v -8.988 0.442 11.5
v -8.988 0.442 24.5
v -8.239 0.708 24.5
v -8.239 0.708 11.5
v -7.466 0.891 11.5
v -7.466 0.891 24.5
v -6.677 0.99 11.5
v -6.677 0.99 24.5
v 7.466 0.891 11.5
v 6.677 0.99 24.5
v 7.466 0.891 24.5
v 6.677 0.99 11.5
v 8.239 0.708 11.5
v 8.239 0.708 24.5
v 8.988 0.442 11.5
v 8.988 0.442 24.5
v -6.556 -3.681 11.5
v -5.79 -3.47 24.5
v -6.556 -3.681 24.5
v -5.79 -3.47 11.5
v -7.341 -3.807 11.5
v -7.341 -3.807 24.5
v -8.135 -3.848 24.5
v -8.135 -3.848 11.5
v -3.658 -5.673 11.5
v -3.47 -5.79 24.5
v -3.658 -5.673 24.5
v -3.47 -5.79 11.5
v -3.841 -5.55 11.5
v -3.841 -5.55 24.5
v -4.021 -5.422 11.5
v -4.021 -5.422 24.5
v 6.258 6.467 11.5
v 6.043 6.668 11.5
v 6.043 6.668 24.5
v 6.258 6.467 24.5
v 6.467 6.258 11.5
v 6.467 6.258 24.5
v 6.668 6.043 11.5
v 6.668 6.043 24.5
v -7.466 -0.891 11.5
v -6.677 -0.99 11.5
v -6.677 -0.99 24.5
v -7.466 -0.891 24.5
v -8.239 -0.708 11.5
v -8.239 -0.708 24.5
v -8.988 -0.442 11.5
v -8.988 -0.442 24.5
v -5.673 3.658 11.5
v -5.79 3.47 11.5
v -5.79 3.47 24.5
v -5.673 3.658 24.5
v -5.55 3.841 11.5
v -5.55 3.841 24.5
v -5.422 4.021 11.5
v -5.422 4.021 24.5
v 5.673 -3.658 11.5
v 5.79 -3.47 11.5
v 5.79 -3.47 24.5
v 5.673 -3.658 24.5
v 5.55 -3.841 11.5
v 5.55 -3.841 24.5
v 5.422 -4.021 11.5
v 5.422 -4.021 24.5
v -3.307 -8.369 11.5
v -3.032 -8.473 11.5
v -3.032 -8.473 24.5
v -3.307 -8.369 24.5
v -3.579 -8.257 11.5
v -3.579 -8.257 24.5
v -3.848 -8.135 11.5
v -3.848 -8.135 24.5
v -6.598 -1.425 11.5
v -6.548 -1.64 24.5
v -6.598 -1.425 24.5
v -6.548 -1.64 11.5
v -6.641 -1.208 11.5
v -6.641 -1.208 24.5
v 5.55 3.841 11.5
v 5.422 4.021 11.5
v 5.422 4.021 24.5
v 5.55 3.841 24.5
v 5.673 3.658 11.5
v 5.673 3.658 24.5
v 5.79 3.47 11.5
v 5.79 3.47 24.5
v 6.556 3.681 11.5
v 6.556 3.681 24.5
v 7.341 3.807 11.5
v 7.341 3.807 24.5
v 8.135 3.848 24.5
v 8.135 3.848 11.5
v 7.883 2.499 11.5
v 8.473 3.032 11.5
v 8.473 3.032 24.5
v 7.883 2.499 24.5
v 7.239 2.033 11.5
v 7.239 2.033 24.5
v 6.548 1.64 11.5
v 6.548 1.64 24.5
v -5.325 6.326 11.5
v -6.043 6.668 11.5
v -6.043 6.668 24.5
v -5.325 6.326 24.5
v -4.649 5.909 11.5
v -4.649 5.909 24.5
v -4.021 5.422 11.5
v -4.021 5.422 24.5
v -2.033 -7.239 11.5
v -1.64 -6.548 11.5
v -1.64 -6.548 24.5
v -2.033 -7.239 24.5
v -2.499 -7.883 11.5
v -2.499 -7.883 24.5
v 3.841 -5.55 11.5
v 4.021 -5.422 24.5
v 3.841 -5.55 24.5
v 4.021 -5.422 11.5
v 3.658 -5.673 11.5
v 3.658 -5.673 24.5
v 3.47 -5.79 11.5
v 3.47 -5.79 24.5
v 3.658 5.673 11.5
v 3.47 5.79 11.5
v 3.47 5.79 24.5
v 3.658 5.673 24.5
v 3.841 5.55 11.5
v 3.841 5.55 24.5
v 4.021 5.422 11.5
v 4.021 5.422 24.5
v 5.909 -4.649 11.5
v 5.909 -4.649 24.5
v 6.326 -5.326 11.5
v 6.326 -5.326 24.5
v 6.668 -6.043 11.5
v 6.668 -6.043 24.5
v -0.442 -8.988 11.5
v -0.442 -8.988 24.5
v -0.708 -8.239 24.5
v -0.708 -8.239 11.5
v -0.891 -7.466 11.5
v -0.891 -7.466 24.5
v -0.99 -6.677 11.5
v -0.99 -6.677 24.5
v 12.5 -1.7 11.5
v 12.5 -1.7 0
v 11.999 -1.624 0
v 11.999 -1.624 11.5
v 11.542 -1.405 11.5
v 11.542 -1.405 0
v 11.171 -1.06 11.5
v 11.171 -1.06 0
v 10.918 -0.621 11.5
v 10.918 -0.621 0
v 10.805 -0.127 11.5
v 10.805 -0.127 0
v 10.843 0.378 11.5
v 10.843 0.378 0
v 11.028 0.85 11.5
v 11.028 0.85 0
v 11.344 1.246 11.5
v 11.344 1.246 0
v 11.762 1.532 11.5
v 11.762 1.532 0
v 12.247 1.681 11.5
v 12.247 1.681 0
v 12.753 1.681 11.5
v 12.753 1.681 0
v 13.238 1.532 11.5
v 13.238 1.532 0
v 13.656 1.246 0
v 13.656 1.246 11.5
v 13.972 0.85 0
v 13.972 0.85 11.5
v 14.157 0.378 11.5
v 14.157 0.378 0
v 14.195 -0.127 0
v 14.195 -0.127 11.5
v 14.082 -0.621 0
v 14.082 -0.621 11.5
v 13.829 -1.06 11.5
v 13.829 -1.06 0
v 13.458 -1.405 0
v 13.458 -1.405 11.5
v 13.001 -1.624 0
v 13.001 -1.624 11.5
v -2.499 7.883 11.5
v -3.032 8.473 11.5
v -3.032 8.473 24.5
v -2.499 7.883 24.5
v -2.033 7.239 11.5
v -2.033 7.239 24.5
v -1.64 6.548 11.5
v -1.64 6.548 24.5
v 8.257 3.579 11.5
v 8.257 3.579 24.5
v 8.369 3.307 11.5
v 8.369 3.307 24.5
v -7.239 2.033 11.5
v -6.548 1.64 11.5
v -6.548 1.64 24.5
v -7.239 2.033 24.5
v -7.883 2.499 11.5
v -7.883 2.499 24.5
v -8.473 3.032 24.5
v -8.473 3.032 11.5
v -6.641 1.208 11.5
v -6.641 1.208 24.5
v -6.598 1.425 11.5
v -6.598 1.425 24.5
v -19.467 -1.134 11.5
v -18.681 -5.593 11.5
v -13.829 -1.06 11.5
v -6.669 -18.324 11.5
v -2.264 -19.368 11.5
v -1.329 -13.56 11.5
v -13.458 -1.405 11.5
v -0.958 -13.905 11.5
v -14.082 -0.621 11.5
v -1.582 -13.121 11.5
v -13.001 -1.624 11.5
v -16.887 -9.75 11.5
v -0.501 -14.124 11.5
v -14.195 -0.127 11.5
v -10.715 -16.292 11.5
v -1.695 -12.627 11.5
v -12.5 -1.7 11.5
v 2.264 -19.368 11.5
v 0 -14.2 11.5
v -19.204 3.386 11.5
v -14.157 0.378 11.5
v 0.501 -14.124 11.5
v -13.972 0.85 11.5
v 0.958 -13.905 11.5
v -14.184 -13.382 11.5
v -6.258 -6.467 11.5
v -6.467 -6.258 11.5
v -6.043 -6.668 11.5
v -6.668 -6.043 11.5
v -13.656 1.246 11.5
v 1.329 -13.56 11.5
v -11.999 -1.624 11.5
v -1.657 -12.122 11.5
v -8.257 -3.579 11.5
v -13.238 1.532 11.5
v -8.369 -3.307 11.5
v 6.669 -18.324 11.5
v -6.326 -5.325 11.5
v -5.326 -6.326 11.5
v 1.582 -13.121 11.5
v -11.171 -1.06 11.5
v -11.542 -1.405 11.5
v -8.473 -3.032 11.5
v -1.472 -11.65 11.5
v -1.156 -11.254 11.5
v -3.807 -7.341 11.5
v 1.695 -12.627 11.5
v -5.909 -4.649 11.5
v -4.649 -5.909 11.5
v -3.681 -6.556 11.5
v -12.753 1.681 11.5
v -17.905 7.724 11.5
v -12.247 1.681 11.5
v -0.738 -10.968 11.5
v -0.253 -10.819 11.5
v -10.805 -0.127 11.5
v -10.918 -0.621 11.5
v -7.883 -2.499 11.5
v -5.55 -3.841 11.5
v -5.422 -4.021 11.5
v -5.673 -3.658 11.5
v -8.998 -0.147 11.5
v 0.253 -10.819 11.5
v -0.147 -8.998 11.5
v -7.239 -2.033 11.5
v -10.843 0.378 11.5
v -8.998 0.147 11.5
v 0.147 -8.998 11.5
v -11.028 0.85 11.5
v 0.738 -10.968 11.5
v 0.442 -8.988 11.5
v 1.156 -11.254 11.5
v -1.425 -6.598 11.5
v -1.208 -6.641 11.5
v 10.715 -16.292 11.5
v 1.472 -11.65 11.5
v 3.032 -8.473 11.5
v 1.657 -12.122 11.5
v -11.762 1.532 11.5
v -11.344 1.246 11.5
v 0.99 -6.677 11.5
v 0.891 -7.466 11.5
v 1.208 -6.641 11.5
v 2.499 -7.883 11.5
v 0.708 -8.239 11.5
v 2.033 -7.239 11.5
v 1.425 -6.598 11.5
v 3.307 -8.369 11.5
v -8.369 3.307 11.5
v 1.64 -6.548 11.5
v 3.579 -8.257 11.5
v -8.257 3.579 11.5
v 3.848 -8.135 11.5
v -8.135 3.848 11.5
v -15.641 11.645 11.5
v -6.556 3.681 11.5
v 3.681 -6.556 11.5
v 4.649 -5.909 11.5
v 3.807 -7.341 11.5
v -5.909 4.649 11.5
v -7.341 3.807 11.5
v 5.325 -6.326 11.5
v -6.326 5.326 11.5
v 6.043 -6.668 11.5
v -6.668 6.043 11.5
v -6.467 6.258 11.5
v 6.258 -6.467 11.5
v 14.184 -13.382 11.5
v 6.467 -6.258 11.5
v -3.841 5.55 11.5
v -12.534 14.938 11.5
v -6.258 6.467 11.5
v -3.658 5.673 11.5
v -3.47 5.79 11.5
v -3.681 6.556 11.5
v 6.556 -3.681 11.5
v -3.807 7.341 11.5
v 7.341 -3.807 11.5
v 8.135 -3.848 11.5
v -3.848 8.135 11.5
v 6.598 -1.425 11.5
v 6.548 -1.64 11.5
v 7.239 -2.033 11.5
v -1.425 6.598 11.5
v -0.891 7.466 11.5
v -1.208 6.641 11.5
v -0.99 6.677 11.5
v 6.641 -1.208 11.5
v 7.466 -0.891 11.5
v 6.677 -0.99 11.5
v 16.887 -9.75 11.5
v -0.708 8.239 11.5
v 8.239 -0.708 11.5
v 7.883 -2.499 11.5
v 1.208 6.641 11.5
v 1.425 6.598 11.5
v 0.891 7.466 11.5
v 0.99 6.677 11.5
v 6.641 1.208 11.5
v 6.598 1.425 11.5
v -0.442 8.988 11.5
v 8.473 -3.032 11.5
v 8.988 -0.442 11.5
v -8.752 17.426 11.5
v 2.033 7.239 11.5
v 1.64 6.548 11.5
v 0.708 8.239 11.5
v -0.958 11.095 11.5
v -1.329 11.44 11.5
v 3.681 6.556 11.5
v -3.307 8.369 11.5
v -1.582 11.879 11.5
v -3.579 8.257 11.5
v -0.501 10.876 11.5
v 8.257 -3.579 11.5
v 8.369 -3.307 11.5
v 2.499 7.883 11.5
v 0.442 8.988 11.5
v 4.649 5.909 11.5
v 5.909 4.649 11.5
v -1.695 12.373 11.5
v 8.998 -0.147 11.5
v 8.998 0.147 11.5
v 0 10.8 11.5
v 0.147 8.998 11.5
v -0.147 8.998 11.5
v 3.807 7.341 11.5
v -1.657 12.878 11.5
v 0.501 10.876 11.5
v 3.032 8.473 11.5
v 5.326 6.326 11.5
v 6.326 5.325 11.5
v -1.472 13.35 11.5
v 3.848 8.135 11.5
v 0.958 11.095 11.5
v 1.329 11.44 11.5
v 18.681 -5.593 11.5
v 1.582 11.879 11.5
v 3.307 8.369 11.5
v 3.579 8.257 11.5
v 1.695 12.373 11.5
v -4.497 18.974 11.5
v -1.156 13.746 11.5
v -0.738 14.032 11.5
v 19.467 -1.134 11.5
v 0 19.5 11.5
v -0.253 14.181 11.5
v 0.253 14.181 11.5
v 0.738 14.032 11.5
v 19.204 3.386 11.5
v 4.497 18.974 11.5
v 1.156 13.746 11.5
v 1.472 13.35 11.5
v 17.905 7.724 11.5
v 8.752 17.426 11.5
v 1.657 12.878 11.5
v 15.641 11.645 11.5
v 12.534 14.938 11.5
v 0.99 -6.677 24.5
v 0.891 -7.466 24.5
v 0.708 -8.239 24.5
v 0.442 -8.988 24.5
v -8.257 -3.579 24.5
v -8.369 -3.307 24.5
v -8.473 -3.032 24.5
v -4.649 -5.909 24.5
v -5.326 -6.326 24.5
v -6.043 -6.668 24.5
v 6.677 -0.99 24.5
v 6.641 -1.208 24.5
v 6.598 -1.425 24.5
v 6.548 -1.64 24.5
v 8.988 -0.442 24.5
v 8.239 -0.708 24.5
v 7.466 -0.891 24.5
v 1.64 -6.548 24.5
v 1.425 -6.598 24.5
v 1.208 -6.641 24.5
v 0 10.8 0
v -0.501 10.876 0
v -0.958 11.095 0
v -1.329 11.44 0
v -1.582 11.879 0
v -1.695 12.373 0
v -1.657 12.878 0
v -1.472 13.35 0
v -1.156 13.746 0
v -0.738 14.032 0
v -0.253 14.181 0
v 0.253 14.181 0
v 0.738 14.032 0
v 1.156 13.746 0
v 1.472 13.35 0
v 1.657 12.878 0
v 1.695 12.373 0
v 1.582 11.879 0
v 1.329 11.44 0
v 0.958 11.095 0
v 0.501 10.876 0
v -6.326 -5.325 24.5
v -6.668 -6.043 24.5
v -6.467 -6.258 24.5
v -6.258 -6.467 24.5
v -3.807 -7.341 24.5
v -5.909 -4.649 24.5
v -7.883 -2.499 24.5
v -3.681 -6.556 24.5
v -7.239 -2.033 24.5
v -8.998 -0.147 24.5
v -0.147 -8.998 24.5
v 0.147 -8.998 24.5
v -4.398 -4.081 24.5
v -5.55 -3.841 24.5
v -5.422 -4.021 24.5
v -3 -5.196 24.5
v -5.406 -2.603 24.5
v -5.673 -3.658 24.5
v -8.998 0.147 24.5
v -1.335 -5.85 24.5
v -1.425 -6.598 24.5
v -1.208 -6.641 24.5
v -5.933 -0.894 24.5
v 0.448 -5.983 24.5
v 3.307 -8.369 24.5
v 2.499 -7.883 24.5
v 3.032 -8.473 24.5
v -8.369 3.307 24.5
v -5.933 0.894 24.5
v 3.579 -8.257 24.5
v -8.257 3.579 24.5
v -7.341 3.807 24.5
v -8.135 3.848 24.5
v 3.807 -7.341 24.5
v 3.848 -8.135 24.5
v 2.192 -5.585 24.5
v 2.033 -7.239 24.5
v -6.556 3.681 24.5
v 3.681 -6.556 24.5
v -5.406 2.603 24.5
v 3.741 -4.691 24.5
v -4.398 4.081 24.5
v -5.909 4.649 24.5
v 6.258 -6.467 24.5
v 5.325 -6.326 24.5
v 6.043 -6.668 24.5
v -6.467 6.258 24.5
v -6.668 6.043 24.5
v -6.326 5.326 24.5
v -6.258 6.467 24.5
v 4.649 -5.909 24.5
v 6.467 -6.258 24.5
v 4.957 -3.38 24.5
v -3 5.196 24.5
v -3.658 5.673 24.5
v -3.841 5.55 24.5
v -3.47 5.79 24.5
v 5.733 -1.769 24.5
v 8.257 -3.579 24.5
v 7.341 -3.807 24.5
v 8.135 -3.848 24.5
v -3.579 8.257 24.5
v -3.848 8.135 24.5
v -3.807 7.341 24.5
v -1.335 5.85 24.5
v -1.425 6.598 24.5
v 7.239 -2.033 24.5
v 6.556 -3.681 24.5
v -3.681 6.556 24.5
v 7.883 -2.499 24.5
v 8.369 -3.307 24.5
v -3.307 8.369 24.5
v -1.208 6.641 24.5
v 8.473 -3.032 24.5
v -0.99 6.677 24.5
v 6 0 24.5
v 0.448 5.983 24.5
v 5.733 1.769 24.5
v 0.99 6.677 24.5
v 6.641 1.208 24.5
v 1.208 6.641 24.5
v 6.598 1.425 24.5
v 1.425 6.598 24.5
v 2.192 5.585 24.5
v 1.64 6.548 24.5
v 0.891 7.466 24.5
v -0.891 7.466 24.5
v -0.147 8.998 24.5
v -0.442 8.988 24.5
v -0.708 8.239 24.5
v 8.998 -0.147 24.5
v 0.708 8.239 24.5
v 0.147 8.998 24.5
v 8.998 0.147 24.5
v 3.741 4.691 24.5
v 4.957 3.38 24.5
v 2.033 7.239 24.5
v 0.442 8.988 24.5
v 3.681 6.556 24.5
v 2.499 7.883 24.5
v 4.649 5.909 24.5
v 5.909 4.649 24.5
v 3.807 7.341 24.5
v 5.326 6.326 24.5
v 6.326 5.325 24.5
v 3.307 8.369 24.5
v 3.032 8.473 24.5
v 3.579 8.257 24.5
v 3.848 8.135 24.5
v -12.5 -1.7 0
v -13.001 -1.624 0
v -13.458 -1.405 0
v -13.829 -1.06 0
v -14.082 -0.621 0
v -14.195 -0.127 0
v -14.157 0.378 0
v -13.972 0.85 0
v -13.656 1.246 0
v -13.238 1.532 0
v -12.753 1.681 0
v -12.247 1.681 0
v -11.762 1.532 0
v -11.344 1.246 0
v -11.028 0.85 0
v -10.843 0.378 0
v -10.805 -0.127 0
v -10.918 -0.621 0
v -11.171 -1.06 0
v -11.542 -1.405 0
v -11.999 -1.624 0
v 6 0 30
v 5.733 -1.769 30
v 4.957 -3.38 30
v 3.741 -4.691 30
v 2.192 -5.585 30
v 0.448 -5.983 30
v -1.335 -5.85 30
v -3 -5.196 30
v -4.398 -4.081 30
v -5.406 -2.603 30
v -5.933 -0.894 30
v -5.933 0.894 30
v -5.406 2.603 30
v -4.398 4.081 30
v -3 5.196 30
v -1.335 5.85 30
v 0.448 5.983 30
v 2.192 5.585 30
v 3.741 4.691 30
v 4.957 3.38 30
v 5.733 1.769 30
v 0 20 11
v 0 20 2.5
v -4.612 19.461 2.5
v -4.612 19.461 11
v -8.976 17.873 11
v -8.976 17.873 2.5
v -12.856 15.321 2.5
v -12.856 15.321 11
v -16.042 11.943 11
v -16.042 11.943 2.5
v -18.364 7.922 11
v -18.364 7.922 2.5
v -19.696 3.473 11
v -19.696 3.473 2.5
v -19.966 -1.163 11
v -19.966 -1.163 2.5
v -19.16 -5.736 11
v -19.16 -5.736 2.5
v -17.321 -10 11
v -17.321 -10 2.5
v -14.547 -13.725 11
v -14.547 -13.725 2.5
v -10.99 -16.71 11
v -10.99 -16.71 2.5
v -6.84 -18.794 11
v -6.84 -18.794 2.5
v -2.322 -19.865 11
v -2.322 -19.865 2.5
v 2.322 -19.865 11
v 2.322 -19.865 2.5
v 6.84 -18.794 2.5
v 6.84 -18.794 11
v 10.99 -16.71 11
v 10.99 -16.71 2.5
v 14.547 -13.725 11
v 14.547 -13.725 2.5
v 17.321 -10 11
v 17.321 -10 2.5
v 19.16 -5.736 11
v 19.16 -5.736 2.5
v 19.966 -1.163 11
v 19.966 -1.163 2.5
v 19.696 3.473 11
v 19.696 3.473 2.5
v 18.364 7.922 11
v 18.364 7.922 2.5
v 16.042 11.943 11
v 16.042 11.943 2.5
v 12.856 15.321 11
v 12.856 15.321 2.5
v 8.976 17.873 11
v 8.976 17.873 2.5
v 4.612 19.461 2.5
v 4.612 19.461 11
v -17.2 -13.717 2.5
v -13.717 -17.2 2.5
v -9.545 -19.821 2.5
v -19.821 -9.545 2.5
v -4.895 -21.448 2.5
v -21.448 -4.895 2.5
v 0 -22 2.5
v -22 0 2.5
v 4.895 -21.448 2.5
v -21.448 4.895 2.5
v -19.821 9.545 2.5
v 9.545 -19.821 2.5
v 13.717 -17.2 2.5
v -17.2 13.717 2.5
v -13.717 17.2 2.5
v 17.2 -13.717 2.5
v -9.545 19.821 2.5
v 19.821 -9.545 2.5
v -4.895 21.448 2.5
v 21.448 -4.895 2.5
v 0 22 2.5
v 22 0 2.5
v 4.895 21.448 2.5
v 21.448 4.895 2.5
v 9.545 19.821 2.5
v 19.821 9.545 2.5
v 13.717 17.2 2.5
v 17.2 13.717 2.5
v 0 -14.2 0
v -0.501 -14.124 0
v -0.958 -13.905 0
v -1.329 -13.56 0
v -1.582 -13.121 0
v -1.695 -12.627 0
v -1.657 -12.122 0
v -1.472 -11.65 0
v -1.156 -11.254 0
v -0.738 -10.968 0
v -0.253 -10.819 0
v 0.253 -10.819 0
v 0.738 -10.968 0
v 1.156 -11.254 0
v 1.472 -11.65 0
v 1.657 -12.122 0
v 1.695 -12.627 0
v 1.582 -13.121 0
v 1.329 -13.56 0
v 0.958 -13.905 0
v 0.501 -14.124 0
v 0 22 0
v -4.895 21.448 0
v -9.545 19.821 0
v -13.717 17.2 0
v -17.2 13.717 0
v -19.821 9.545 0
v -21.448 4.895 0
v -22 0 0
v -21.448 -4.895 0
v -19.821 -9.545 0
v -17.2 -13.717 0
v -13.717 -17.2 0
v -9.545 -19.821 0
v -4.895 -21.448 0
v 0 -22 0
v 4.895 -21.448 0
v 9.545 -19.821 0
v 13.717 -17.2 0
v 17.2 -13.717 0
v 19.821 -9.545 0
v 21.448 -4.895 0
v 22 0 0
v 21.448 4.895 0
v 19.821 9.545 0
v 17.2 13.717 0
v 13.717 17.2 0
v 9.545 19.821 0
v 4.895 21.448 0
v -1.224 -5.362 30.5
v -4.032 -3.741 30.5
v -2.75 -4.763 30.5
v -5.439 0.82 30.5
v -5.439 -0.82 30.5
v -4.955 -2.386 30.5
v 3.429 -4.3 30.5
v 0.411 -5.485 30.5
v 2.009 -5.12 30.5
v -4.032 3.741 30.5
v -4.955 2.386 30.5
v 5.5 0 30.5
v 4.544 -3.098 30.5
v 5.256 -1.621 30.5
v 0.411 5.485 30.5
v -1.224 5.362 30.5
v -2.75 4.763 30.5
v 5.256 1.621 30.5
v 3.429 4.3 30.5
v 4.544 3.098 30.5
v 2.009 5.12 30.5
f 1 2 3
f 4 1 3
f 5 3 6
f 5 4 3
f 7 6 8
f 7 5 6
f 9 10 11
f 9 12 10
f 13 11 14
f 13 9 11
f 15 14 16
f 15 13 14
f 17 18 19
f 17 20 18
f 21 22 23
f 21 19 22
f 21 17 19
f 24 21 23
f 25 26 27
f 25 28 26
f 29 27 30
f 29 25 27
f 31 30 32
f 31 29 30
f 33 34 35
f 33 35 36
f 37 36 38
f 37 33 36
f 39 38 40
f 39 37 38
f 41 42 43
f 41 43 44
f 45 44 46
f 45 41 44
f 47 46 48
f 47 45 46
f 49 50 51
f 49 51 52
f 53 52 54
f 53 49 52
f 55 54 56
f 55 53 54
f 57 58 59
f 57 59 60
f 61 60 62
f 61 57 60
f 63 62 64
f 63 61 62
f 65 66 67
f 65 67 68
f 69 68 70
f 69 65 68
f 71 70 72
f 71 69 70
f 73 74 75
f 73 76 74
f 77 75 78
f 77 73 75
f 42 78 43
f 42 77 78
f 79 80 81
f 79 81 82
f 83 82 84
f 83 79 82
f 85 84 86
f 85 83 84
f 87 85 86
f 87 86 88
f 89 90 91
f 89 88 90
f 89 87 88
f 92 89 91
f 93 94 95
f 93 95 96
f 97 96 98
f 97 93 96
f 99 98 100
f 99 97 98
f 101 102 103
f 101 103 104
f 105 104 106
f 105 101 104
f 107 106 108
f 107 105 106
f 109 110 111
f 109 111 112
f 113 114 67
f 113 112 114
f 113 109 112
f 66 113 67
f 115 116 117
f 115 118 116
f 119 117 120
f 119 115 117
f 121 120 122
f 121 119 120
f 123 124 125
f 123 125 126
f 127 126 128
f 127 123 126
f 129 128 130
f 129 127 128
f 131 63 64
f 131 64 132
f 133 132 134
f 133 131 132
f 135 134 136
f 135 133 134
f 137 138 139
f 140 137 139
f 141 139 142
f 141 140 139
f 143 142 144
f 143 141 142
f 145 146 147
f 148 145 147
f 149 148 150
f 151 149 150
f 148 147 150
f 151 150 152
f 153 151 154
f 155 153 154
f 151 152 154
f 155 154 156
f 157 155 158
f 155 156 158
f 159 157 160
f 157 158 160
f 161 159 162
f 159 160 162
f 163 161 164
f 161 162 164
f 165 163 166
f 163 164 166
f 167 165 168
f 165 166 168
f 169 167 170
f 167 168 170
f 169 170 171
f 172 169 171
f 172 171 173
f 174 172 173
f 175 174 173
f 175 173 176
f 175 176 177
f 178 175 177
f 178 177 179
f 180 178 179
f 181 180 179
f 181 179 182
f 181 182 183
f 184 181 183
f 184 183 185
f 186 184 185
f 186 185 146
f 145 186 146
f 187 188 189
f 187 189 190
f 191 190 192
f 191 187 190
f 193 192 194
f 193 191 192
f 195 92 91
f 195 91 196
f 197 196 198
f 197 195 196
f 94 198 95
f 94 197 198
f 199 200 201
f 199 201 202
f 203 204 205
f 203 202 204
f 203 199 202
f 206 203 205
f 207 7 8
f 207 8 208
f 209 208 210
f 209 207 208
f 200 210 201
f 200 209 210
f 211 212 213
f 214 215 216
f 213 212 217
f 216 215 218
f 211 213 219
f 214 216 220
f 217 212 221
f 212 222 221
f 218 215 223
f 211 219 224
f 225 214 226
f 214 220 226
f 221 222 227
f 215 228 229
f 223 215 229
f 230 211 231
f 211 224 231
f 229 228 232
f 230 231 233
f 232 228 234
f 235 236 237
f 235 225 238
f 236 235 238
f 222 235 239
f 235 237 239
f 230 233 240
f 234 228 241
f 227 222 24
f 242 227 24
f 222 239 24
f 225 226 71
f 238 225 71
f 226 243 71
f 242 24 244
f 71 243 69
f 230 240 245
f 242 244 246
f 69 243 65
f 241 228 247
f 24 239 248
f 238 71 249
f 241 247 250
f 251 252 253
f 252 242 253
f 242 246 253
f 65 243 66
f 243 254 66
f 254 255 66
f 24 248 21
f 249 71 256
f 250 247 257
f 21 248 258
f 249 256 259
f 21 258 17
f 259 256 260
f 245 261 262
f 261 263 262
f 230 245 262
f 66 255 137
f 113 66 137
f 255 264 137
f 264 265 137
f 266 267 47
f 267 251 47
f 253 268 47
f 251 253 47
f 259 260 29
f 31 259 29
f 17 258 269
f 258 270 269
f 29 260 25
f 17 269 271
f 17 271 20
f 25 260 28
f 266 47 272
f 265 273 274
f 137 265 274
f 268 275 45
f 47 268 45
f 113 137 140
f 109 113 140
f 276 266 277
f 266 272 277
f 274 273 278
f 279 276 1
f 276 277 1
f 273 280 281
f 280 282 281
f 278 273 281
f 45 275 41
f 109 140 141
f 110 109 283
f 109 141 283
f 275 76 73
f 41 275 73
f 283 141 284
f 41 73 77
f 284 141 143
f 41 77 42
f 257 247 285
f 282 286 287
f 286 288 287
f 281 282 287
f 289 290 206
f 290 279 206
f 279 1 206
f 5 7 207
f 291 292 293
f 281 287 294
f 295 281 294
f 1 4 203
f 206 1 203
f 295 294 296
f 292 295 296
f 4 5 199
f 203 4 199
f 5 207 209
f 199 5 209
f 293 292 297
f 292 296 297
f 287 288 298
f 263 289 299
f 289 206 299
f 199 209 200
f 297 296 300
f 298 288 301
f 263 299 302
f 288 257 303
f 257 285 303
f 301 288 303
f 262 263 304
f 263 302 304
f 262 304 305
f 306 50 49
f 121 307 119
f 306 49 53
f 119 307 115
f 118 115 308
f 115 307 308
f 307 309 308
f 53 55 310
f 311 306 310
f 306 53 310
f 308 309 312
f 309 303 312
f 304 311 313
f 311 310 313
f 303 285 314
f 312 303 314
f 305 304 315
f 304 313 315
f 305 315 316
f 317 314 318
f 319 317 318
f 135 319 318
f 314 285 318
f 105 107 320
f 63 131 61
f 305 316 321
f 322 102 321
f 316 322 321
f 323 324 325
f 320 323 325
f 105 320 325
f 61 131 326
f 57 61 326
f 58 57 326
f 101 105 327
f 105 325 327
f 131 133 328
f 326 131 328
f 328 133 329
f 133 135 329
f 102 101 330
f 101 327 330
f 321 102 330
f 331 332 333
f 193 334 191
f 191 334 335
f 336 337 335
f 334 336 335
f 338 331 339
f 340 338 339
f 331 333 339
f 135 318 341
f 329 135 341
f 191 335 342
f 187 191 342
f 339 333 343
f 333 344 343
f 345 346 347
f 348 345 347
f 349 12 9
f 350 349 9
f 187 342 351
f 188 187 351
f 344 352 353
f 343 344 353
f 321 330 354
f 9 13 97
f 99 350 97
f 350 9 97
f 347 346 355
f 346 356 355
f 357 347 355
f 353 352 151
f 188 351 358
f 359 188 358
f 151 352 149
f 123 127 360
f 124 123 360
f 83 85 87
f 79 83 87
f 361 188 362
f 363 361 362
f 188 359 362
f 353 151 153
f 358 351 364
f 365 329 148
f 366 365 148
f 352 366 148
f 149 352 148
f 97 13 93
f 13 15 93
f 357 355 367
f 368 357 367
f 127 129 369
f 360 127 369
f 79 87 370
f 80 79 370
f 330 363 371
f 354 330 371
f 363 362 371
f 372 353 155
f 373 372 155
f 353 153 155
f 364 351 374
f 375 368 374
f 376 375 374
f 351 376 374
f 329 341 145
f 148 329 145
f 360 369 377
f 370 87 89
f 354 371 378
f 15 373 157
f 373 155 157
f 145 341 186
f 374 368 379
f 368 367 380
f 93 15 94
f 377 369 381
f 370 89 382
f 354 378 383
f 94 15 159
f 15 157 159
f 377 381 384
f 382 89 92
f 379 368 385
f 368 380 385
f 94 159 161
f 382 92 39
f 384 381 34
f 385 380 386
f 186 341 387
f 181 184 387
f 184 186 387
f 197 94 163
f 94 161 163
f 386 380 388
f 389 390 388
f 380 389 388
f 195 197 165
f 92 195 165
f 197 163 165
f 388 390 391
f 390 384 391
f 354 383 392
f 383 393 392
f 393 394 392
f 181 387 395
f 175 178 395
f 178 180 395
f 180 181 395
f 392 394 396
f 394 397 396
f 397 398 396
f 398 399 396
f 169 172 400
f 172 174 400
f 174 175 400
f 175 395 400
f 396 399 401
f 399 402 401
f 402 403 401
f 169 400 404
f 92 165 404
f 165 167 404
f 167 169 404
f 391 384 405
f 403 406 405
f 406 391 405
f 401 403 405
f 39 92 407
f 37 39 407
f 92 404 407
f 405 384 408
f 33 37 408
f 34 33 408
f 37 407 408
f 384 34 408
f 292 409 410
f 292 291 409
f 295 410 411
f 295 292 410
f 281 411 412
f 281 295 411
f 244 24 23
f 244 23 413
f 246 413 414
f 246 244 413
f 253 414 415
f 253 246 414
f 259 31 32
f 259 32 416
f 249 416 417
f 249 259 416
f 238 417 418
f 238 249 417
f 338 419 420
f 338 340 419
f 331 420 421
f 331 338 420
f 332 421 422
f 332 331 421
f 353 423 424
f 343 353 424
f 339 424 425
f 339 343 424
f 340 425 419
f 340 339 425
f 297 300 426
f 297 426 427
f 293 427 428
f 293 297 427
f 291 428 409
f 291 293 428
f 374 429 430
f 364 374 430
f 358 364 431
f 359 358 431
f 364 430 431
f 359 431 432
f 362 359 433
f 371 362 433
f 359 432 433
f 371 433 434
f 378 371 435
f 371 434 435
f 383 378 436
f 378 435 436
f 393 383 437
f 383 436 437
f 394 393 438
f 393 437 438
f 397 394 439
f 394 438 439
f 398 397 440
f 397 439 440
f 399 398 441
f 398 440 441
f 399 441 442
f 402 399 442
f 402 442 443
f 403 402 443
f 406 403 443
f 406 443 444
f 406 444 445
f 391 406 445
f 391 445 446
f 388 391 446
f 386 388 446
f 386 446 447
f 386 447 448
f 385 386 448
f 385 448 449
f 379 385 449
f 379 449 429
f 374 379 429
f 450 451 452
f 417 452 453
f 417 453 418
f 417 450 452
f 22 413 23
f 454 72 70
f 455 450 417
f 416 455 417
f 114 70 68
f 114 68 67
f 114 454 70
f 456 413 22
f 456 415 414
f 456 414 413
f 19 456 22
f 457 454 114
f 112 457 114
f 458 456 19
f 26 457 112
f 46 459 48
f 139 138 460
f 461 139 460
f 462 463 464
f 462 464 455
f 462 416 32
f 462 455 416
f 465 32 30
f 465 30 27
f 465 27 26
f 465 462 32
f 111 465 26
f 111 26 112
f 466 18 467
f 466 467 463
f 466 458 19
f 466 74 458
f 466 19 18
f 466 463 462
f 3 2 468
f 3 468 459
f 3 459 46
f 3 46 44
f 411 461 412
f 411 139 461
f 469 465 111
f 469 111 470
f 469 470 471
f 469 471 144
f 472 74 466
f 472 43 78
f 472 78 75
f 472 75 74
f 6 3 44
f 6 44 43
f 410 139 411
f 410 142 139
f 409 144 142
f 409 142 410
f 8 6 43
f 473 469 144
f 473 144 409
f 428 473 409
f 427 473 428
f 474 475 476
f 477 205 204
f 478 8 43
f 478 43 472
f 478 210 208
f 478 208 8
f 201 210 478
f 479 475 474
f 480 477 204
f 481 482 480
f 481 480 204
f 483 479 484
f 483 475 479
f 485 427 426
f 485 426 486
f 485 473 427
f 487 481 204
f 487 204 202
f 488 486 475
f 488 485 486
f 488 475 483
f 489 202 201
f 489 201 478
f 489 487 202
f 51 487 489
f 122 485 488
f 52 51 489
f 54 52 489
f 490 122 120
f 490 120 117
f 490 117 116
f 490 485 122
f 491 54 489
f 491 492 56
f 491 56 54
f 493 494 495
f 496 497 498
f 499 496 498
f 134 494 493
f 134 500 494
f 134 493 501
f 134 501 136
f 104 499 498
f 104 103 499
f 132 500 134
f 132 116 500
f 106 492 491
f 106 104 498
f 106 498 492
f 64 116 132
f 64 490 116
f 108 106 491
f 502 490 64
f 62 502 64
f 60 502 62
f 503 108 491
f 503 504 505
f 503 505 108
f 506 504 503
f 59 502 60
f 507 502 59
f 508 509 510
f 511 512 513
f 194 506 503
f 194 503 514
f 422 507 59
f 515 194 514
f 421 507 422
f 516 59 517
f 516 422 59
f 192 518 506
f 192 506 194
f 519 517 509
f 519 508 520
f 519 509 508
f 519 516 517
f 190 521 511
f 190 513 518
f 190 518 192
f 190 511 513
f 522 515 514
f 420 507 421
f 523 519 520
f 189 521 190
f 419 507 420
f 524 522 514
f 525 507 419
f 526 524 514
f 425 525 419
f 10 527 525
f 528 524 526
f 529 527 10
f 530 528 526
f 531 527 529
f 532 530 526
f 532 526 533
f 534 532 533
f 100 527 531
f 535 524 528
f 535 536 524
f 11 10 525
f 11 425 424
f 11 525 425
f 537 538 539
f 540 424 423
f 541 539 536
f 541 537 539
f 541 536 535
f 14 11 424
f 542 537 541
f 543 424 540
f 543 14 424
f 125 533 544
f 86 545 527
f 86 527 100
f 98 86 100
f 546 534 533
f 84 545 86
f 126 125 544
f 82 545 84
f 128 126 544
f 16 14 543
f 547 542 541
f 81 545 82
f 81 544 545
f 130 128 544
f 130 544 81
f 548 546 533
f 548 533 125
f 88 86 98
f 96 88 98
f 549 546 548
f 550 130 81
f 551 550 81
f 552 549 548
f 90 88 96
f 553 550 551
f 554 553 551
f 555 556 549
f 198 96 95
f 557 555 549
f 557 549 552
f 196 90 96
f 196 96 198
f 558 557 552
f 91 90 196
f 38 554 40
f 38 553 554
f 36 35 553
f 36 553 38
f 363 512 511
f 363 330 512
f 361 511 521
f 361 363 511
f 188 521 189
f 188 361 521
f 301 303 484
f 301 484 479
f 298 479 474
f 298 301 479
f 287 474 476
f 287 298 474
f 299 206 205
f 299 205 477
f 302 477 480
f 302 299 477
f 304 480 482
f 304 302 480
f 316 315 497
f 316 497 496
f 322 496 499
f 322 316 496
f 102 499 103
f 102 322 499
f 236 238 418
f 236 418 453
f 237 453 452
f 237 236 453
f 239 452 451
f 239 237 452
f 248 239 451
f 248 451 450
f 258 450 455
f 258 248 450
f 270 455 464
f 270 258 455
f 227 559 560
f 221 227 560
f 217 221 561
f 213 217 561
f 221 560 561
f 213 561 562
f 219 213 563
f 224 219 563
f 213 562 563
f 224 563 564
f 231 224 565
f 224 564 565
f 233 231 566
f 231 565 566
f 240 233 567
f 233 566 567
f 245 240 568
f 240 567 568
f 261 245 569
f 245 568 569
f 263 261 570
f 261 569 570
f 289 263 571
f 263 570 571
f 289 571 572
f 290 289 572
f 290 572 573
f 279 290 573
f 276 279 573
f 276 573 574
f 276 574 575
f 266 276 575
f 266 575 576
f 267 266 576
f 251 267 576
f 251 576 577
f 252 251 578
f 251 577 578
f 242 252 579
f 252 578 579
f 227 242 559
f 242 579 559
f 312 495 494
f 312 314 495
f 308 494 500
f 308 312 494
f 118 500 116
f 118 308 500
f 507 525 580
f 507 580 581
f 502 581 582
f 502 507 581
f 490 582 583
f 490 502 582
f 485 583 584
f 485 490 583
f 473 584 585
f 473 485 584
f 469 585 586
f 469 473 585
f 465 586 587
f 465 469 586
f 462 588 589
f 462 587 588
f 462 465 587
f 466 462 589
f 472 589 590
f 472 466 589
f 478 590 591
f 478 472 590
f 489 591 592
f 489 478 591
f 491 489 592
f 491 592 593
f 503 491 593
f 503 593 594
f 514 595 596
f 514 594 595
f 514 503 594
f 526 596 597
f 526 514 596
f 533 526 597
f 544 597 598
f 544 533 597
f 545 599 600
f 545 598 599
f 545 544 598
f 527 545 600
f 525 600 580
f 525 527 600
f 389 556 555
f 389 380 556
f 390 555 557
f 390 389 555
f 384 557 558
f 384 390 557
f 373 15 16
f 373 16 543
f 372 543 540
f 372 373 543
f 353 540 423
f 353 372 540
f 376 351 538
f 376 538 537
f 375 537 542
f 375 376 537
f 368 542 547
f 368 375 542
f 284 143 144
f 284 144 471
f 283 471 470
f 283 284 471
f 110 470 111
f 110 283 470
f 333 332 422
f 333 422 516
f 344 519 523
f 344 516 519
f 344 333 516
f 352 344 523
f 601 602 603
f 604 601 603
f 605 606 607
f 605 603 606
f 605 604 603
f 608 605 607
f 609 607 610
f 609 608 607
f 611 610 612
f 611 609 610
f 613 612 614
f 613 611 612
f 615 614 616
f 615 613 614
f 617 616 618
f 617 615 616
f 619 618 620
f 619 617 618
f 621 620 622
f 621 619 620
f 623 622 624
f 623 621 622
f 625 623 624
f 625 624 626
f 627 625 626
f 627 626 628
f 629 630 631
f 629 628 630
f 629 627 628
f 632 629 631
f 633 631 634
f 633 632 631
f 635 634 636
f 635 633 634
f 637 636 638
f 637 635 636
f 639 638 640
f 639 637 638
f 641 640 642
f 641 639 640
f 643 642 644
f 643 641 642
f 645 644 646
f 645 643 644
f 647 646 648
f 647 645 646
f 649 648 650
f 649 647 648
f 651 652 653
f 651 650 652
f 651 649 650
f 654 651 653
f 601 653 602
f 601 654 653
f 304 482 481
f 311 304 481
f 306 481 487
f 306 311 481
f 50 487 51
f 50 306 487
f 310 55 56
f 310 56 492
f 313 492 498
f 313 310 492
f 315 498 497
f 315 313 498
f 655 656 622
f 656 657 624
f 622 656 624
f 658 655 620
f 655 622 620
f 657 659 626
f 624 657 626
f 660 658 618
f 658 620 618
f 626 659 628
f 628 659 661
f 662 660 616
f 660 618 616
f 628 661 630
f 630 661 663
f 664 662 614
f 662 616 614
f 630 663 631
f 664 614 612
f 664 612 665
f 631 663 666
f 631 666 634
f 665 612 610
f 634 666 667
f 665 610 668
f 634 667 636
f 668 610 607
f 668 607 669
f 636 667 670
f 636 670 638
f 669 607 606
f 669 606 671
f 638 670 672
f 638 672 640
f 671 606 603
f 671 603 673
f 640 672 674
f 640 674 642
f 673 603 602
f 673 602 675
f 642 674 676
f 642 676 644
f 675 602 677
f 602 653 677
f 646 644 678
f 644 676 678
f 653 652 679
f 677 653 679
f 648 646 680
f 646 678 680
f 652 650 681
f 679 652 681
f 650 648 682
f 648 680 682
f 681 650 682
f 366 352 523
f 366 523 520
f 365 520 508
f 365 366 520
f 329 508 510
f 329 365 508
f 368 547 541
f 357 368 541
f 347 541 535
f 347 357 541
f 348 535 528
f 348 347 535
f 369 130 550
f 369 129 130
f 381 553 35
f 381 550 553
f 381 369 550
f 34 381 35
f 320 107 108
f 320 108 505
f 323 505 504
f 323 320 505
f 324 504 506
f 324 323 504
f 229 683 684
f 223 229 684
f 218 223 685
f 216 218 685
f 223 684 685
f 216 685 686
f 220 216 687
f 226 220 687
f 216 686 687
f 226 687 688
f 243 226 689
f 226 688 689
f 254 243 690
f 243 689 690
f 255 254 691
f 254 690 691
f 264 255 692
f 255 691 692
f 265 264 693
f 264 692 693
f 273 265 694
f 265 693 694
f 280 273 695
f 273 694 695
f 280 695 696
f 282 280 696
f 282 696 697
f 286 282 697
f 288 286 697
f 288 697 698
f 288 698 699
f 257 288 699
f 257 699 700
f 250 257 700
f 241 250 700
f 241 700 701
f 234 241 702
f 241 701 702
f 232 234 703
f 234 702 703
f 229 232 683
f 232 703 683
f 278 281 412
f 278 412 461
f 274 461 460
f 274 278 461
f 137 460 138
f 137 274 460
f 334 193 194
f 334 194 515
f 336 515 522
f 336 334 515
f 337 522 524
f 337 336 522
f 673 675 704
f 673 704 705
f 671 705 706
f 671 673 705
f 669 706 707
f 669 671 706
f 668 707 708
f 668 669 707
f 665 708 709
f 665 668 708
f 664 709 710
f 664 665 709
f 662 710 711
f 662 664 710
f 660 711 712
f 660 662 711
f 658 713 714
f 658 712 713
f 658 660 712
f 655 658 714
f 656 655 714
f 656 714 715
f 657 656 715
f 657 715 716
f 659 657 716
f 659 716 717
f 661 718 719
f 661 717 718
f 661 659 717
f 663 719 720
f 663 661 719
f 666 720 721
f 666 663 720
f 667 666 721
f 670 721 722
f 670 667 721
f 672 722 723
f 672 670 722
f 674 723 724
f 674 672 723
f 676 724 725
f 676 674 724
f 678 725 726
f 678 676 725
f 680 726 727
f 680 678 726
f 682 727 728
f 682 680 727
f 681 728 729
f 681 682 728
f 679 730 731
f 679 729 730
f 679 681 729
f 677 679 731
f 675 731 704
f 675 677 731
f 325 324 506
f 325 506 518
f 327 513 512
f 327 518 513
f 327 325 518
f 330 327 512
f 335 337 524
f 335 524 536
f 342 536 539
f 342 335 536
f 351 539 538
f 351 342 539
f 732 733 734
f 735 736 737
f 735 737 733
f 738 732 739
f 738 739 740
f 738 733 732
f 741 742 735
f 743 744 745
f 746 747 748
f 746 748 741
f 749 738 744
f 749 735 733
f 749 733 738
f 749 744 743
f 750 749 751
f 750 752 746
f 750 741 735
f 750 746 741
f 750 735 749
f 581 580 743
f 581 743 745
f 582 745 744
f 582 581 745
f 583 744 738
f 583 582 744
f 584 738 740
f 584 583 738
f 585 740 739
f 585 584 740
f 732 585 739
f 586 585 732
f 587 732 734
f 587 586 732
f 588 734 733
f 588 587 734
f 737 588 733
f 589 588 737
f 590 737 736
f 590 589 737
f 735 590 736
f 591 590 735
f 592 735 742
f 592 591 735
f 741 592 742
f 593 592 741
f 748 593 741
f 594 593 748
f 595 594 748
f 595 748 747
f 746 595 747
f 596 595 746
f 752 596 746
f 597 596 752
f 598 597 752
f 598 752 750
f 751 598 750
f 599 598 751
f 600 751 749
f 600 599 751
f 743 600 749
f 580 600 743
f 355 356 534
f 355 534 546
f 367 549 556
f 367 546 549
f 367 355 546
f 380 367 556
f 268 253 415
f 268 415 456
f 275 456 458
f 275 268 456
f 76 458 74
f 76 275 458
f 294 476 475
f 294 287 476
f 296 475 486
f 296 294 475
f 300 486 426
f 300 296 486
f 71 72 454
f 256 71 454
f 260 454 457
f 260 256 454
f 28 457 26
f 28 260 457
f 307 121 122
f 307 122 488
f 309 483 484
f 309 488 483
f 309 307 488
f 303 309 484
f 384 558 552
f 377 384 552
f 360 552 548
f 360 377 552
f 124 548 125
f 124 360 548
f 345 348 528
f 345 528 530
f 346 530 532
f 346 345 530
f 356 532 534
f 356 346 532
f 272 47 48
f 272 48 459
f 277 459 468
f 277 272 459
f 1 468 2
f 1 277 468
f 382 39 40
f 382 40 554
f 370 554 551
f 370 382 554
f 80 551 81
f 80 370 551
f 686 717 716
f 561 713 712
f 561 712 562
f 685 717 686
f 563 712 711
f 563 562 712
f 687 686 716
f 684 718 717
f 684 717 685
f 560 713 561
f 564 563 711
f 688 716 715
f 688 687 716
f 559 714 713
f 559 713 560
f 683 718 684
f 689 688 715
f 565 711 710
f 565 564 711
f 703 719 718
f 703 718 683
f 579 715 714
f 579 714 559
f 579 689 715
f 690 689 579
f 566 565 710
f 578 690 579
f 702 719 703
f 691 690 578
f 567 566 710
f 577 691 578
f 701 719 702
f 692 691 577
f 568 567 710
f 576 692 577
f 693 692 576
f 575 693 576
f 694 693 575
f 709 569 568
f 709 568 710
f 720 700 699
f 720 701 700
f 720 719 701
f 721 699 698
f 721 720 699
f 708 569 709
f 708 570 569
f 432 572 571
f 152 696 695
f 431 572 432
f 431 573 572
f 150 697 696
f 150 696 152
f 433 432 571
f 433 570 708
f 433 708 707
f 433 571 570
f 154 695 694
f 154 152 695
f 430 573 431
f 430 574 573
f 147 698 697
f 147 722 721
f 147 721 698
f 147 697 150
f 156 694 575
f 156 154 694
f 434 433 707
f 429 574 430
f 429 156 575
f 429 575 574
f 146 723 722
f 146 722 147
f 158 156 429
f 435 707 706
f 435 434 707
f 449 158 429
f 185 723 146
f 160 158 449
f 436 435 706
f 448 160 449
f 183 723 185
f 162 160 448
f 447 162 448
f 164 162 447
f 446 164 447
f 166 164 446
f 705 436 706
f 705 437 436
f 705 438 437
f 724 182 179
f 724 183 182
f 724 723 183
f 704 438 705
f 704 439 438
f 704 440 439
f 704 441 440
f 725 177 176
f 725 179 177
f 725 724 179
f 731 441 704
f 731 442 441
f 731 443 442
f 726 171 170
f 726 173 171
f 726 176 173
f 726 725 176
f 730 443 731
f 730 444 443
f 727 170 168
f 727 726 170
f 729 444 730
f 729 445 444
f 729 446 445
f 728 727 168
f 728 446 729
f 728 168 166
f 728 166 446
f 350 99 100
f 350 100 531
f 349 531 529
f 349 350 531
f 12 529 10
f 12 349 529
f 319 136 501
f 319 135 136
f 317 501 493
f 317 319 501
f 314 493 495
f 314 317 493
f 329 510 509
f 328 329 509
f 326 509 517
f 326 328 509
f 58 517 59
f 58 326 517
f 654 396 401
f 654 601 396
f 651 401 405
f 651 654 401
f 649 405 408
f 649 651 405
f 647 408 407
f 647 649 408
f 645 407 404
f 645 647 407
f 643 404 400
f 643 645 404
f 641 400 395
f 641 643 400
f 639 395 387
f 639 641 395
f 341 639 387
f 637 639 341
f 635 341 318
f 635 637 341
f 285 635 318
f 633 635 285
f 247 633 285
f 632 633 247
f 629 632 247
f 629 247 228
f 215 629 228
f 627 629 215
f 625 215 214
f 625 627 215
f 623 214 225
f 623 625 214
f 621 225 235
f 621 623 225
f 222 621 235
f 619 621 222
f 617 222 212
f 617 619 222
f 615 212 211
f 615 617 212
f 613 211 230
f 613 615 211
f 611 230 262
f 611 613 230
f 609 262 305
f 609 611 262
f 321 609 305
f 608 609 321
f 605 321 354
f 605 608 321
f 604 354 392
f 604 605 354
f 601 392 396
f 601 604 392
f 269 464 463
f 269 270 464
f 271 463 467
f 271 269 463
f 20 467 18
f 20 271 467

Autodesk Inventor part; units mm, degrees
ref_plane "YZ Plane" through (0, 0, 0) normal (1, 0, 0) x (0, 1, 0)
ref_plane "XZ Plane" through (0, 0, 0) normal (0, 1, 0) x (-1, 0, 0)
ref_plane "XY Plane" through (0, 0, 0) normal (0, 0, 1) x (1, 0, 0)
sketch "スケッチ1" plane through (0, 0, 0) normal (1, 0, 0) x (0, 1, 0)
  line L0 (22, 0) -> (22, 2.5)
  line L1 (22, 2.5) -> (20, 2.5)
  line L2 (20, 2.5) -> (20, 11.5)
  line L3 (20, 11.5) -> (0, 11.5)
  line L4 (0, 11.5) -> (0, 0)
  line L5 (0, 0) -> (22, 0)
  dimension "d0" = 20
  dimension "d1" = 9
  dimension "d2" = 2.5
  dimension "d3" = 2
revolve "回転1" add sketch "スケッチ1" angle 360 about axis through (0, 0, 11.5) along (0, 0, -1)
sketch "スケッチ2" plane through (0, 0, 11.5) normal (0, 0, 1) x (1, 0, 0)
  arc A0 (-3.8476, 8.135) -> (-3.4702, 5.7897) centre (3.494, 8.1133) ccw
  arc A1 (-3.4702, 5.7897) -> (-4.021, 5.4217) centre (0, 0) ccw
  arc A2 (-4.021, 5.4217) -> (-6.0434, 6.6678) centre (-8.8328, -0.1232) ccw
  arc A3 (-6.0434, 6.6678) -> (-6.6678, 6.0434) centre (0, 0) ccw
  arc A4 (-6.6678, 6.0434) -> (-5.4217, 4.021) centre (0.1232, 8.8328) ccw
  arc A5 (-5.4217, 4.021) -> (-5.7897, 3.4702) centre (0, 0) ccw
  arc A6 (-5.7897, 3.4702) -> (-8.135, 3.8476) centre (-8.1133, -3.494) ccw
  arc A7 (-8.135, 3.8476) -> (-8.473, 3.0317) centre (0, 0) ccw
  arc A8 (-8.473, 3.0317) -> (-6.5477, 1.6401) centre (-3.2664, 8.2076) ccw
  arc A9 (-6.5477, 1.6401) -> (-6.6769, 0.9904) centre (0, 0) ccw
  arc A10 (-6.6769, 0.9904) -> (-8.9882, 0.4416) centre (-6.1586, -6.3328) ccw
  arc A11 (-8.9882, 0.4416) -> (-8.9882, -0.4416) centre (0, 0) ccw
  arc A12 (-8.9882, -0.4416) -> (-6.6769, -0.9904) centre (-6.1586, 6.3328) ccw
  arc A13 (-6.6769, -0.9904) -> (-6.5477, -1.6401) centre (0, 0) ccw
  arc A14 (-6.5477, -1.6401) -> (-8.473, -3.0317) centre (-3.2664, -8.2076) ccw
  arc A15 (-8.473, -3.0317) -> (-8.135, -3.8476) centre (0, 0) ccw
  arc A16 (-8.135, -3.8476) -> (-5.7897, -3.4702) centre (-8.1133, 3.494) ccw
  arc A17 (-5.7897, -3.4702) -> (-5.4217, -4.021) centre (0, 0) ccw
  arc A18 (-5.4217, -4.021) -> (-6.6678, -6.0434) centre (0.1232, -8.8328) ccw
  arc A19 (-6.6678, -6.0434) -> (-6.0434, -6.6678) centre (0, 0) ccw
  arc A20 (-6.0434, -6.6678) -> (-4.021, -5.4217) centre (-8.8328, 0.1232) ccw
  arc A21 (-4.021, -5.4217) -> (-3.4702, -5.7897) centre (0, 0) ccw
  arc A22 (-3.4702, -5.7897) -> (-3.8476, -8.135) centre (3.494, -8.1133) ccw
  arc A23 (-3.8476, -8.135) -> (-3.0317, -8.473) centre (0, 0) ccw
  arc A24 (-3.0317, -8.473) -> (-1.6401, -6.5477) centre (-8.2076, -3.2664) ccw
  arc A25 (-1.6401, -6.5477) -> (-0.9904, -6.6769) centre (0, 0) ccw
  arc A26 (-0.9904, -6.6769) -> (-0.4416, -8.9882) centre (6.3328, -6.1586) ccw
  arc A27 (-0.4416, -8.9882) -> (0.4416, -8.9882) centre (0, 0) ccw
  arc A28 (0.4416, -8.9882) -> (0.9904, -6.6769) centre (-6.3328, -6.1586) ccw
  arc A29 (0.9904, -6.6769) -> (1.6401, -6.5477) centre (0, 0) ccw
  arc A30 (1.6401, -6.5477) -> (3.0317, -8.473) centre (8.2076, -3.2664) ccw
  arc A31 (3.0317, -8.473) -> (3.8476, -8.135) centre (0, 0) ccw
  arc A32 (3.8476, -8.135) -> (3.4702, -5.7897) centre (-3.494, -8.1133) ccw
  arc A33 (3.4702, -5.7897) -> (4.021, -5.4217) centre (0, 0) ccw
  arc A34 (4.021, -5.4217) -> (6.0434, -6.6678) centre (8.8328, 0.1232) ccw
  arc A35 (6.0434, -6.6678) -> (6.6678, -6.0434) centre (0, 0) ccw
  arc A36 (6.6678, -6.0434) -> (5.4217, -4.021) centre (-0.1232, -8.8328) ccw
  arc A37 (5.4217, -4.021) -> (5.7897, -3.4702) centre (0, 0) ccw
  arc A38 (5.7897, -3.4702) -> (8.135, -3.8476) centre (8.1133, 3.494) ccw
  arc A39 (8.135, -3.8476) -> (8.473, -3.0317) centre (0, 0) ccw
  arc A40 (8.473, -3.0317) -> (6.5477, -1.6401) centre (3.2664, -8.2076) ccw
  arc A41 (6.5477, -1.6401) -> (6.6769, -0.9904) centre (0, 0) ccw
  arc A42 (6.6769, -0.9904) -> (8.9882, -0.4416) centre (6.1586, 6.3328) ccw
  arc A43 (8.9882, -0.4416) -> (8.9882, 0.4416) centre (0, 0) ccw
  arc A44 (8.9882, 0.4416) -> (6.6769, 0.9904) centre (6.1586, -6.3328) ccw
  arc A45 (6.6769, 0.9904) -> (6.5477, 1.6401) centre (0, 0) ccw
  arc A46 (6.5477, 1.6401) -> (8.473, 3.0317) centre (3.2664, 8.2076) ccw
  arc A47 (8.473, 3.0317) -> (8.135, 3.8476) centre (0, 0) ccw
  arc A48 (8.135, 3.8476) -> (5.7897, 3.4702) centre (8.1133, -3.494) ccw
  arc A49 (5.7897, 3.4702) -> (5.4217, 4.021) centre (0, 0) ccw
  arc A50 (5.4217, 4.021) -> (6.6678, 6.0434) centre (-0.1232, 8.8328) ccw
  arc A51 (6.6678, 6.0434) -> (6.0434, 6.6678) centre (0, 0) ccw
  arc A52 (6.0434, 6.6678) -> (4.021, 5.4217) centre (8.8328, -0.1232) ccw
  arc A53 (4.021, 5.4217) -> (3.4702, 5.7897) centre (0, 0) ccw
  arc A54 (3.4702, 5.7897) -> (3.8476, 8.135) centre (-3.494, 8.1133) ccw
  arc A55 (3.8476, 8.135) -> (3.0317, 8.473) centre (0, 0) ccw
  arc A56 (3.0317, 8.473) -> (1.6401, 6.5477) centre (8.2076, 3.2664) ccw
  arc A57 (1.6401, 6.5477) -> (0.9904, 6.6769) centre (0, 0) ccw
  arc A58 (0.9904, 6.6769) -> (0.4416, 8.9882) centre (-6.3328, 6.1586) ccw
  arc A59 (0.4416, 8.9882) -> (-0.4416, 8.9882) centre (0, 0) ccw
  arc A60 (-0.4416, 8.9882) -> (-0.9904, 6.6769) centre (6.3328, 6.1586) ccw
  arc A61 (-0.9904, 6.6769) -> (-1.6401, 6.5477) centre (0, 0) ccw
  arc A62 (-1.6401, 6.5477) -> (-3.0317, 8.473) centre (-8.2076, 3.2664) ccw
  arc A63 (-3.0317, 8.473) -> (-3.8476, 8.135) centre (0, 0) ccw
  point P0 (0, 0)
extrude "押し出し1" add sketch "スケッチ2" along normal blind 13
sketch "スケッチ3" plane through (0, 0, 24.5) normal (0, 0, 1) x (1, 0, 0)
  circle A0 centre (0, 0) radius 6
  dimension "d7" = 12
extrude "押し出し2" add sketch "スケッチ3" along normal blind 6
chamfer "面取り1" distance 0.5 angle 45 2 edges at (-6, 0, 30.5) (0, -20, 11.5)
sketch "スケッチ4" plane through (0, 0, 11.5) normal (0, 0, 1) x (1, 0, 0)
  circle A0 centre (0, 0) radius 12.5
  point P0 (0, 0)
  point P1 (0, 12.5)
  point P2 (-12.5, 0)
  point P3 (0, -12.5)
  point P4 (12.5, 0)
  dimension "d13" = 25
  dimension "d16" = 360
hole "穴1" at (0, 12.5, 11.5) at (-12.5, 0, 11.5) at (0, -12.5, 11.5) at (12.5, 0, 11.5) direction (0, 0, -1) diameter 3.4 end through all clearance for "Flat Head Machine Screw" size "M3" standard "Ansi Metric M Profile"
properties part number "s-assy-sun_gear" material "ABS プラスチック"
